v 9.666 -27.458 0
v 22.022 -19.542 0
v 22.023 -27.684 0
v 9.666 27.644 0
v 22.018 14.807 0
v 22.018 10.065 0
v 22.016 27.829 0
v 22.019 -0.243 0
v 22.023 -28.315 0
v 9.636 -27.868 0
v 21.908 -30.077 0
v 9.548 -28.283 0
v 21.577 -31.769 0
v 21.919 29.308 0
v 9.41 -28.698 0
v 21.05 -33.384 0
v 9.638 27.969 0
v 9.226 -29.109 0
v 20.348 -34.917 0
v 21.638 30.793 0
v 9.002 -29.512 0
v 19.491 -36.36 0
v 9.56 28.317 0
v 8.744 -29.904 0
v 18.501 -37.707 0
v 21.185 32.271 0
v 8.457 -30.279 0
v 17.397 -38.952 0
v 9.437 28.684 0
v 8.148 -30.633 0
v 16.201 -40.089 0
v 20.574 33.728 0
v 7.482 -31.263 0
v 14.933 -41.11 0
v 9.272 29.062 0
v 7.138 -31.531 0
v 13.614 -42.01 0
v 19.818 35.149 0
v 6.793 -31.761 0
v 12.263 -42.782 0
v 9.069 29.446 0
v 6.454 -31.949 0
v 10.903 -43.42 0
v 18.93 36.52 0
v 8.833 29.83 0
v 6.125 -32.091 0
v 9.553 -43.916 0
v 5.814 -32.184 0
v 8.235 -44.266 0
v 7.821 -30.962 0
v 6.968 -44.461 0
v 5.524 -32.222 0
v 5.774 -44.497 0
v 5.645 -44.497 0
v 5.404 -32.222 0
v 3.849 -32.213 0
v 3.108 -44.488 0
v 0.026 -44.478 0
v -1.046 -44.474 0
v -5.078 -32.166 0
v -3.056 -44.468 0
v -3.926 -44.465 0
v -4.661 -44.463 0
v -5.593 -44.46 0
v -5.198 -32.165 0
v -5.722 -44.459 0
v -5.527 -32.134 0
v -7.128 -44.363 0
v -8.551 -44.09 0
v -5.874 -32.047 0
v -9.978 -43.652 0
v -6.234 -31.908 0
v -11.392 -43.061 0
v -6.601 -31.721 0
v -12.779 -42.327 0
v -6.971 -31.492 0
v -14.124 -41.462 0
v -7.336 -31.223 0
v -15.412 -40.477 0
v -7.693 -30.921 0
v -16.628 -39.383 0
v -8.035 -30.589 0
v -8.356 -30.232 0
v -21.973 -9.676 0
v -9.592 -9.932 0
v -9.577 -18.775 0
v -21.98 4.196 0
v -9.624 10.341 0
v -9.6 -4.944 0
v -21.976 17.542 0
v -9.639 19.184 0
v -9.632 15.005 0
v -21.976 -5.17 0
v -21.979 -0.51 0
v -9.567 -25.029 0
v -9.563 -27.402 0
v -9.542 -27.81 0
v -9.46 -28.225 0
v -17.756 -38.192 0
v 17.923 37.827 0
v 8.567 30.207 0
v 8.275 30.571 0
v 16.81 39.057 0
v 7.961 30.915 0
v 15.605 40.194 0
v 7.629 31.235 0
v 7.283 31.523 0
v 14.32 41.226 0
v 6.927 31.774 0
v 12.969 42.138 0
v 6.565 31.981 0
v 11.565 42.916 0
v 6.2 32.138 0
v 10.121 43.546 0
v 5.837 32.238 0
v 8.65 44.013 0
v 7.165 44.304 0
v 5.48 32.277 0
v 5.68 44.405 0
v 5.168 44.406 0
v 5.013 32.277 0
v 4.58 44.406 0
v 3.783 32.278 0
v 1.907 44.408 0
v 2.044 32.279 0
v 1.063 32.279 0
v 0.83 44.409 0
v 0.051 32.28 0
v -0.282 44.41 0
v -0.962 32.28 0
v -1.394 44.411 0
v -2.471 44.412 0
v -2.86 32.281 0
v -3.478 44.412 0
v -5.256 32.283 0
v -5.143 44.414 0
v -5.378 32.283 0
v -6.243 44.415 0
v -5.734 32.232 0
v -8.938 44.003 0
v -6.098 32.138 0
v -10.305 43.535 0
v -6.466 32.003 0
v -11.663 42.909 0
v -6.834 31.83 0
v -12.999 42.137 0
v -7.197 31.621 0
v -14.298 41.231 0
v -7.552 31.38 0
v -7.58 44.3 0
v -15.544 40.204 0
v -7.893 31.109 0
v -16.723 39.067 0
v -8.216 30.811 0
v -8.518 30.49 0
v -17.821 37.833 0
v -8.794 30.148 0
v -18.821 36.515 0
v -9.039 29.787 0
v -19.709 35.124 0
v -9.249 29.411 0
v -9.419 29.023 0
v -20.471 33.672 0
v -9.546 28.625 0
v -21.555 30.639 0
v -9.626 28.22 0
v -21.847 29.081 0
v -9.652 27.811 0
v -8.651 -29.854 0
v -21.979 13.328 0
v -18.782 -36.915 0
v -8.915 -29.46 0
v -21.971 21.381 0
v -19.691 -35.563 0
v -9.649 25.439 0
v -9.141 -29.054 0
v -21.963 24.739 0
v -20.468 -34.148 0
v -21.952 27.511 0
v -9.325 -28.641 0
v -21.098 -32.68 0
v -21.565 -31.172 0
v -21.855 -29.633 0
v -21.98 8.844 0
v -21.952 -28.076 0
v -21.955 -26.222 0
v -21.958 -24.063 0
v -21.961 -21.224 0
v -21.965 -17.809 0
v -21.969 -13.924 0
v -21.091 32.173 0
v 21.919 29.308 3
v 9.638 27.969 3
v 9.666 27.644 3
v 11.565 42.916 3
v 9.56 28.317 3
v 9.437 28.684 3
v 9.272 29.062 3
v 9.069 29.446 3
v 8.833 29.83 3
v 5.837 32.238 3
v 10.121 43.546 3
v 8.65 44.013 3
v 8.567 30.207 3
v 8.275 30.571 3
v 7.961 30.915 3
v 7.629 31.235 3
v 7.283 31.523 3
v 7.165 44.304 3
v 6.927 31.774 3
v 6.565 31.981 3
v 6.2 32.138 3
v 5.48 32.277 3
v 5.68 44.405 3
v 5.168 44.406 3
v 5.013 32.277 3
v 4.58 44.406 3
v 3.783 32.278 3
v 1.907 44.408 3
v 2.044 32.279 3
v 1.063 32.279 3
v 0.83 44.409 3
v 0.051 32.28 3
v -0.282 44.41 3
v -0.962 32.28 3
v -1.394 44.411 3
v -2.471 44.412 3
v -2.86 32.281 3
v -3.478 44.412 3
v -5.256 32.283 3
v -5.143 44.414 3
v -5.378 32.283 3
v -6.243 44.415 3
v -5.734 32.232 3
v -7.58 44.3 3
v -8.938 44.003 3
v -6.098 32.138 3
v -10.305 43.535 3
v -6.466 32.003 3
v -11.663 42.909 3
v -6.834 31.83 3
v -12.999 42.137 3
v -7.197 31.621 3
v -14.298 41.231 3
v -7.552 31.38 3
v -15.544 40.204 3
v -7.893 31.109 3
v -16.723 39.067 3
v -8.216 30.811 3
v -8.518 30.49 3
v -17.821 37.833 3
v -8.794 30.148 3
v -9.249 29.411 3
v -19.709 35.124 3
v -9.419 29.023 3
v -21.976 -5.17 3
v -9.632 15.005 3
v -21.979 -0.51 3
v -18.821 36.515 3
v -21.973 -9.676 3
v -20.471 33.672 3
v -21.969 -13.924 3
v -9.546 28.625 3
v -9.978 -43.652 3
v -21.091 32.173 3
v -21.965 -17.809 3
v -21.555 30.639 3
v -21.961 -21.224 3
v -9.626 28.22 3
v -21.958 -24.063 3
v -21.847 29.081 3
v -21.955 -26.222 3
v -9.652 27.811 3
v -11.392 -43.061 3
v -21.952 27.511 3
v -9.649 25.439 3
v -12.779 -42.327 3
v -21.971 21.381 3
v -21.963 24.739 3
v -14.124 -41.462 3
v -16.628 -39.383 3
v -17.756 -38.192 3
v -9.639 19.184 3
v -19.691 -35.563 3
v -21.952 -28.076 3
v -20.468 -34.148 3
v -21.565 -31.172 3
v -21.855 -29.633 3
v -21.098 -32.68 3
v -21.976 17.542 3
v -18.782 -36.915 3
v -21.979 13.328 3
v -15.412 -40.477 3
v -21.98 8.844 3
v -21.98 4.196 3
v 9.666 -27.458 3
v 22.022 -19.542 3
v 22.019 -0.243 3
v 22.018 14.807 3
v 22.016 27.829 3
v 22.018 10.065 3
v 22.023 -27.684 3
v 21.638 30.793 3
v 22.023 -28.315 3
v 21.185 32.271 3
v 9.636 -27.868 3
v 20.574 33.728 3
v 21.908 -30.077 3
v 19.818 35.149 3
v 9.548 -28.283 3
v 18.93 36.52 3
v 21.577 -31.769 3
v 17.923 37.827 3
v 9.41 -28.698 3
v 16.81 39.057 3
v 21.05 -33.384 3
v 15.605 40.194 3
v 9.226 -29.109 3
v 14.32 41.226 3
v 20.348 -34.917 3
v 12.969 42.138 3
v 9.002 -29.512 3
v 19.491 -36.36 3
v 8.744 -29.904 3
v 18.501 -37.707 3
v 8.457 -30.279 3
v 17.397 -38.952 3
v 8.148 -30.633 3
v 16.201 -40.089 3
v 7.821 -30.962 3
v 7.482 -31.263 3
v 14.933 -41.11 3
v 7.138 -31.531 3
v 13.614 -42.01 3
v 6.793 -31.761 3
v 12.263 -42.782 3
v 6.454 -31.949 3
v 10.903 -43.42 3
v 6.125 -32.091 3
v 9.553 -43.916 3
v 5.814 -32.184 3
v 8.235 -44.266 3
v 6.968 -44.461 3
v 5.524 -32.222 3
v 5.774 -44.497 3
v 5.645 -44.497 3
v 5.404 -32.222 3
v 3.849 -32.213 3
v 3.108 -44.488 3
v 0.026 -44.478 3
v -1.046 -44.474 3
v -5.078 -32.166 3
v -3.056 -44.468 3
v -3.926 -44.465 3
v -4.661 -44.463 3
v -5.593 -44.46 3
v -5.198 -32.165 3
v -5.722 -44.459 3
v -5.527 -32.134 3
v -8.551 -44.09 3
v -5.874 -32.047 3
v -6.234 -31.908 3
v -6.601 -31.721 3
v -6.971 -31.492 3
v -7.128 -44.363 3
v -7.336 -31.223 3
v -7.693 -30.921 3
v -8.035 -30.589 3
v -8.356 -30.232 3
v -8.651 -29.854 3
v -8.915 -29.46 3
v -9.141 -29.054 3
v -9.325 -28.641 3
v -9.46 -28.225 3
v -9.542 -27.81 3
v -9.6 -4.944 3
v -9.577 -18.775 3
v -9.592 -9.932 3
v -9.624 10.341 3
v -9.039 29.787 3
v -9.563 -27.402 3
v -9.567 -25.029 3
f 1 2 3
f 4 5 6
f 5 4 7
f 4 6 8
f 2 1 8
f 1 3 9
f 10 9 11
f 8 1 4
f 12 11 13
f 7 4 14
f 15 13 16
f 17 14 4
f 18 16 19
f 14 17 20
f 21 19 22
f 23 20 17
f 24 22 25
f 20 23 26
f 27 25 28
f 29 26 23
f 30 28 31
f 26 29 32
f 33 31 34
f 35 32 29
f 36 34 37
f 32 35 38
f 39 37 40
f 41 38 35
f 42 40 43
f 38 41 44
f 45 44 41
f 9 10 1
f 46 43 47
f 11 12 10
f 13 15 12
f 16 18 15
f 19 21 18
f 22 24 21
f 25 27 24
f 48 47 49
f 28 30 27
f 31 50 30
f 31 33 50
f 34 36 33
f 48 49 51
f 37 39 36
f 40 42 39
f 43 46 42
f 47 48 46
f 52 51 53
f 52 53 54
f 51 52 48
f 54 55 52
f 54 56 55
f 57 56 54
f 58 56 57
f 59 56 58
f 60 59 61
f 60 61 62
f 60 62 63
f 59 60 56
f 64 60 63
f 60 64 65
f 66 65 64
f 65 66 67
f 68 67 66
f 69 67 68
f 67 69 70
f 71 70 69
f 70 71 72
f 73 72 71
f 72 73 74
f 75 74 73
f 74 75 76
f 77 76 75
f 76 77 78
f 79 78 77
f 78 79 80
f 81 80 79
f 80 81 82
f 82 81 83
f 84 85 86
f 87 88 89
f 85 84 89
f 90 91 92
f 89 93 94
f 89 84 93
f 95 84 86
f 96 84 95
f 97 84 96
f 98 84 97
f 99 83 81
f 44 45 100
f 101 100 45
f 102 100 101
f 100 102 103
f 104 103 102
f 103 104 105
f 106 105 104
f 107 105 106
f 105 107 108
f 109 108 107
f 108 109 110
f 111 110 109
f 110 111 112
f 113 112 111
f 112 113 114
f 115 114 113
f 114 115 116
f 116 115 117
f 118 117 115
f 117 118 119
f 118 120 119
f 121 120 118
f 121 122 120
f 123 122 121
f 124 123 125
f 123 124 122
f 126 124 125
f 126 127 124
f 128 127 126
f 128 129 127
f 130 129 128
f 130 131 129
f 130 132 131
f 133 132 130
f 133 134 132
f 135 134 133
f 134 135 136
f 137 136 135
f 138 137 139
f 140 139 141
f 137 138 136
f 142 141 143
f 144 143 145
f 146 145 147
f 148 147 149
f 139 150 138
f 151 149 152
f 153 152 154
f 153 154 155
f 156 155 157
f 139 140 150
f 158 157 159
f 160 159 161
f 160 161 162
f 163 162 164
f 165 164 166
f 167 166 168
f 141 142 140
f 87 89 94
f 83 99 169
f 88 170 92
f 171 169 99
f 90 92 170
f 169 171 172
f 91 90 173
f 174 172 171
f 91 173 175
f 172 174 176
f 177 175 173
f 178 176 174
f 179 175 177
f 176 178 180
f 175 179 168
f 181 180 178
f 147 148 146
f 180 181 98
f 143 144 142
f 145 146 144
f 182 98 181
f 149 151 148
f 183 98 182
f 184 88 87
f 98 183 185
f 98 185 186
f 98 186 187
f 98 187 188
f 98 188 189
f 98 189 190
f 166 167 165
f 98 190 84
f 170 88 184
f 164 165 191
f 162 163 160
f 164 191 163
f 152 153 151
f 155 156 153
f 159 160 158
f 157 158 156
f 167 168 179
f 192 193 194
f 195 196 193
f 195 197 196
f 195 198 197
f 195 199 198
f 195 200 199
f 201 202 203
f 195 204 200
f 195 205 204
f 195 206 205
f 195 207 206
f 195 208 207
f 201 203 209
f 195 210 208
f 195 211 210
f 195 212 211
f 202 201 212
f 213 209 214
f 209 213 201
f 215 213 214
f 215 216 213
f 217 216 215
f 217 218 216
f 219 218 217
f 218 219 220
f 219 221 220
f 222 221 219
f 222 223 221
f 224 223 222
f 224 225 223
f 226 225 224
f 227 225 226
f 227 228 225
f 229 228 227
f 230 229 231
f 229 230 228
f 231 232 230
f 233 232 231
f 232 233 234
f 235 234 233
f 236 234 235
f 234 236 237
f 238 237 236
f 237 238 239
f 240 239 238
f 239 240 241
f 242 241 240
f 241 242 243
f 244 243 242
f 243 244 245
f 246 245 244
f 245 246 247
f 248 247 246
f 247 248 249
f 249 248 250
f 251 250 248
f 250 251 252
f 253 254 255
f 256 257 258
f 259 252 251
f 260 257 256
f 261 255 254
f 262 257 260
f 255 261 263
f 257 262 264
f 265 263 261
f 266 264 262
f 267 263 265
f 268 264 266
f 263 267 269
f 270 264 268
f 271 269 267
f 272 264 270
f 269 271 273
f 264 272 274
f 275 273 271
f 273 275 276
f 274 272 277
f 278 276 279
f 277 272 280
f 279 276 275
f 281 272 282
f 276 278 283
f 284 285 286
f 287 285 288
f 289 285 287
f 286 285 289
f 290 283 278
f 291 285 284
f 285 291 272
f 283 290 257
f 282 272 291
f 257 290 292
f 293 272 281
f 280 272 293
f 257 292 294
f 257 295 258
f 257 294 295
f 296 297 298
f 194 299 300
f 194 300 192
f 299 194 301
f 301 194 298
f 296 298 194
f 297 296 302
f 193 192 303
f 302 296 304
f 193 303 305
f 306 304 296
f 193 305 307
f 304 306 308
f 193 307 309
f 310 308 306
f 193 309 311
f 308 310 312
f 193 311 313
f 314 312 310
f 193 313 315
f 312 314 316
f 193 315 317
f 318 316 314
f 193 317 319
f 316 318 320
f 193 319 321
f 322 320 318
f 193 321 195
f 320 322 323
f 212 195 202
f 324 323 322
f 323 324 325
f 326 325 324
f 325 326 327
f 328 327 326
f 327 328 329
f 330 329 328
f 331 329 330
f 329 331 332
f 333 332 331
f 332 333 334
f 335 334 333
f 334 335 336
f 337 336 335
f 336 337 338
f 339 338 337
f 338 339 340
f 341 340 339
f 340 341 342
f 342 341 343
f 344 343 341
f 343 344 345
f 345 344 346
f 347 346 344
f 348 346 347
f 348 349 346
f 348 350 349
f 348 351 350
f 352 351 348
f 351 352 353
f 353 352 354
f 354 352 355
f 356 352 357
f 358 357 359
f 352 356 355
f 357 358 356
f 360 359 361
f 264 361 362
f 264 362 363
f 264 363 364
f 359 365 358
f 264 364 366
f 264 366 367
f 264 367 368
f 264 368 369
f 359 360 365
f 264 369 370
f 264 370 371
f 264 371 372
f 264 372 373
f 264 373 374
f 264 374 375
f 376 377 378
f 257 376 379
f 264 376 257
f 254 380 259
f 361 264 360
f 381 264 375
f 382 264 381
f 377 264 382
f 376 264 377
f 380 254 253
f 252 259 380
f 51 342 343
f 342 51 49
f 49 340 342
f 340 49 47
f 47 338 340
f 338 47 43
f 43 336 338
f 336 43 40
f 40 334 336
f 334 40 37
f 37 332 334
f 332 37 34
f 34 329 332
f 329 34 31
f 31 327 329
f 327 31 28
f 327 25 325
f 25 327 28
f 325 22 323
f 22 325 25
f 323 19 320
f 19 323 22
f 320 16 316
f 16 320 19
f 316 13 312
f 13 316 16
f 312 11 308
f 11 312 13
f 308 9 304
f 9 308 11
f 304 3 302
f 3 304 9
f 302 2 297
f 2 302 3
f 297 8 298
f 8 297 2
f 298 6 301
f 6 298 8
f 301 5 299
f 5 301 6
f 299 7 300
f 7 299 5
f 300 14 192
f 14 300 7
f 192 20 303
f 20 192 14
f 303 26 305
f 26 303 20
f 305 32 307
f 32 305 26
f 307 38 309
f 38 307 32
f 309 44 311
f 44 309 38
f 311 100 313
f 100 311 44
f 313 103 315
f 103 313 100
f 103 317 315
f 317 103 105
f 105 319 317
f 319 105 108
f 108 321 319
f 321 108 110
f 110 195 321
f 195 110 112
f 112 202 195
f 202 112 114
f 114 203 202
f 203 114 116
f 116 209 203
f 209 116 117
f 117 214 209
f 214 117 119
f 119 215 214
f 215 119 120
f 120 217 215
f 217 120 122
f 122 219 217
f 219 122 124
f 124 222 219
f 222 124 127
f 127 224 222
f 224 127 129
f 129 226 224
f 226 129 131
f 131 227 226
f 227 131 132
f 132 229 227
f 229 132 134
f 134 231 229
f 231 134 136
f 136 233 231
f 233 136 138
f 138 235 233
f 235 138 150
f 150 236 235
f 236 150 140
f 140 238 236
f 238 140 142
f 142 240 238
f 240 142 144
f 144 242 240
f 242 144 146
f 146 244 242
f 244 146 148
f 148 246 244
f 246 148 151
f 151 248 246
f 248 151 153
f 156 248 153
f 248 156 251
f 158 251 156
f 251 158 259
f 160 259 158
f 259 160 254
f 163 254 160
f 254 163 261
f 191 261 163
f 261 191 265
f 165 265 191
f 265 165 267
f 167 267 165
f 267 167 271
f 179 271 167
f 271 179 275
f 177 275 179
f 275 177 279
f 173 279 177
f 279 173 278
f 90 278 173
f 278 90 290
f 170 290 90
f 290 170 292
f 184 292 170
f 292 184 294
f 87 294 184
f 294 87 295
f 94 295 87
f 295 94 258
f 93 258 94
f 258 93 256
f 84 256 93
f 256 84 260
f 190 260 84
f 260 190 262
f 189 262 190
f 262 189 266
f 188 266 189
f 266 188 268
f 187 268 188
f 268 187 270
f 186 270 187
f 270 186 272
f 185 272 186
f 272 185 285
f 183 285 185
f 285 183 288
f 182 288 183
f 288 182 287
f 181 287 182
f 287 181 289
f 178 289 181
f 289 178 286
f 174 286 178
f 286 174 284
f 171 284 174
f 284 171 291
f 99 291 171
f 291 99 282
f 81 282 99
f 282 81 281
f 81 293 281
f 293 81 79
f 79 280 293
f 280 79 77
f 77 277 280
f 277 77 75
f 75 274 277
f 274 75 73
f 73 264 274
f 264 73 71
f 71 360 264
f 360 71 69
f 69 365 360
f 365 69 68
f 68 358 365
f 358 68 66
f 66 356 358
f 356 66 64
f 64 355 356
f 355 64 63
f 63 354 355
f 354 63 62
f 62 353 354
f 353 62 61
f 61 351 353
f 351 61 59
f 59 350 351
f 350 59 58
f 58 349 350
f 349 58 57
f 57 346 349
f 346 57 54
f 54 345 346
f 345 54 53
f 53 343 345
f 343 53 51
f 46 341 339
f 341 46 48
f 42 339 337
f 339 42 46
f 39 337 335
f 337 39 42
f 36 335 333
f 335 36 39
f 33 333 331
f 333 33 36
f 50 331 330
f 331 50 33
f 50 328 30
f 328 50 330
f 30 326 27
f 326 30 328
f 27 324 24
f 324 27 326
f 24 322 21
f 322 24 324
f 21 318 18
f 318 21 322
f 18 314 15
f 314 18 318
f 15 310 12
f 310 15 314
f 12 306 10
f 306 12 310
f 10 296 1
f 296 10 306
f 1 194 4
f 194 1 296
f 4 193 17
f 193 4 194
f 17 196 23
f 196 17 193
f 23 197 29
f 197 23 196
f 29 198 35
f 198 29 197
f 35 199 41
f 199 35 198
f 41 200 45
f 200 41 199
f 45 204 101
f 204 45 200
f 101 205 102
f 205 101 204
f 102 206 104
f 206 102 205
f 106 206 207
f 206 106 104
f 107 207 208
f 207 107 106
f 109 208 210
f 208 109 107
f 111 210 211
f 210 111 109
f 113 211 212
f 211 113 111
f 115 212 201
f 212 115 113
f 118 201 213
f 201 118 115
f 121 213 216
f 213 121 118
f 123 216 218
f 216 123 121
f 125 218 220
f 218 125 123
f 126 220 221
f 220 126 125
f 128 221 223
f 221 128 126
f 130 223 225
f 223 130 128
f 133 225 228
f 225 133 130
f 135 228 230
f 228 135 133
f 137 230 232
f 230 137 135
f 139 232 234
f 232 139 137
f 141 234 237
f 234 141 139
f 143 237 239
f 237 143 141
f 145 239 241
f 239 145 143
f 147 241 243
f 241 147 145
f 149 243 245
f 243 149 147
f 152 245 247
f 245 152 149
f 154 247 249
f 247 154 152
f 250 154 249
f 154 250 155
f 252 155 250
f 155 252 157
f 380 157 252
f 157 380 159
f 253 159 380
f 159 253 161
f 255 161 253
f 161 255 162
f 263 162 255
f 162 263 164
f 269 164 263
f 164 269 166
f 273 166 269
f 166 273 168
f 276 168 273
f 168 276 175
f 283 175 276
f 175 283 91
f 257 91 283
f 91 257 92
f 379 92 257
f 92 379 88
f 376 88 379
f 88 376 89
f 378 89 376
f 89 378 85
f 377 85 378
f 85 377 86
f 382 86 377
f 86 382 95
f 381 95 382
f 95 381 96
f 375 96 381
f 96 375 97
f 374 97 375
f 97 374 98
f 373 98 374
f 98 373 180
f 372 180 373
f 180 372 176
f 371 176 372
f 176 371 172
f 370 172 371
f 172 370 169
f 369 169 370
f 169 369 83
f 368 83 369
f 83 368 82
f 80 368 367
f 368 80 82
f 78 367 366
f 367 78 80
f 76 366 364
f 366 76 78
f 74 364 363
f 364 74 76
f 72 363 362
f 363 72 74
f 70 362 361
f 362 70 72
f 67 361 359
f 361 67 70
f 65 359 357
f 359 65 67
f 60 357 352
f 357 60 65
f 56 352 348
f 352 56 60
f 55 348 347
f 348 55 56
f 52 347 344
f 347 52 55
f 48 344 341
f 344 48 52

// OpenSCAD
// Generated from 交通部公路局（原交通部公路總局）「新式號牌使用之英文字、數字字體」author trace
fudge = 0.1;

module glyph_2012_O(h = 3) {
  difference() {
    linear_extrude(height = h)
      polygon(points = [[-6.2432, 44.4146], [-7.5797, 44.3003], [-8.9385, 44.0032], [-10.3046, 43.5355], [-11.6631, 42.9094], [-12.9991, 42.1373], [-14.2978, 41.2313], [-15.5442, 40.2038], [-16.7235, 39.067], [-17.8207, 37.8332], [-18.821, 36.5147], [-19.7094, 35.1237], [-20.4711, 33.6725], [-21.0912, 32.1735], [-21.5547, 30.6388], [-21.8468, 29.0807], [-21.9525, 27.5115], [-21.9629, 24.7395], [-21.9707, 21.3811], [-21.976, 17.542], [-21.9792, 13.3277], [-21.9805, 8.8438], [-21.9803, 4.1958], [-21.9788, -0.5105], [-21.9762, -5.1698], [-21.9729, -9.6763], [-21.9692, -13.9245], [-21.9652, -17.8088], [-21.9614, -21.2236], [-21.9579, -24.0634], [-21.9551, -26.2225], [-21.9532, -27.5954], [-21.9525, -28.0765], [-21.8549, -29.6333], [-21.565, -31.1717], [-21.0978, -32.6803], [-20.4683, -34.148], [-19.6915, -35.5633], [-18.7825, -36.9152], [-17.7562, -38.1922], [-16.6277, -39.3832], [-15.412, -40.4768], [-14.1242, -41.4617], [-12.7791, -42.3268], [-11.392, -43.0607], [-9.9777, -43.6521], [-8.5513, -44.0899], [-7.1278, -44.3626], [-5.7223, -44.4591], [-5.5932, -44.4596], [-5.2283, -44.4608], [-4.6614, -44.4626], [-3.926, -44.4651], [-3.0559, -44.4679], [-2.0848, -44.4711], [-1.0463, -44.4745], [0.0259, -44.4781], [1.098, -44.4816], [2.1365, -44.485], [3.1077, -44.4882], [3.9777, -44.4911], [4.7131, -44.4935], [5.2801, -44.4954], [5.6449, -44.4966], [5.774, -44.497], [6.9683, -44.4615], [8.235, -44.2658], [9.5535, -43.9164], [10.9032, -43.4197], [12.2635, -42.7822], [13.6136, -42.0103], [14.9331, -41.1104], [16.2012, -40.089], [17.3974, -38.9525], [18.5009, -37.7074], [19.4913, -36.36], [20.3478, -34.9168], [21.0498, -33.3842], [21.5767, -31.7687], [21.9079, -30.0767], [22.0228, -28.3147], [22.0227, -27.6842], [22.0225, -25.9023], [22.0222, -23.1335], [22.0218, -19.5423], [22.0213, -15.2931], [22.0207, -10.5506], [22.0201, -5.479], [22.0195, -0.243], [22.0189, 4.9931], [22.0183, 10.0646], [22.0178, 14.8072], [22.0173, 19.0563], [22.0169, 22.6476], [22.0166, 25.4163], [22.0164, 27.1982], [22.0163, 27.8288], [21.9195, 29.3077], [21.6381, 30.7932], [21.1853, 32.2713], [20.5743, 33.7277], [19.8181, 35.1486], [18.93, 36.5197], [17.923, 37.8271], [16.8103, 39.0568], [15.605, 40.1945], [14.3203, 41.2263], [12.9693, 42.1382], [11.5652, 42.9159], [10.1211, 43.5456], [8.65, 44.0131], [7.1653, 44.3044], [5.6799, 44.4054], [5.546, 44.4055], [5.1676, 44.4058], [4.5796, 44.4062], [3.8169, 44.4068], [2.9145, 44.4075], [1.9074, 44.4083], [0.8303, 44.4091], [-0.2816, 44.41], [-1.3936, 44.4108], [-2.4706, 44.4117], [-3.4778, 44.4124], [-4.3802, 44.4131], [-5.1429, 44.4137], [-5.7309, 44.4142], [-6.1093, 44.4145]]);
    translate([0, 0, -fudge])
      linear_extrude(height = h + 2 * fudge)
        polygon(points = [[-5.3779, 32.2828], [-5.256, 32.2828], [-4.9114, 32.2826], [-4.376, 32.2823], [-3.6814, 32.2819], [-2.8597, 32.2814], [-1.9425, 32.2809], [-0.9617, 32.2804], [0.0509, 32.2798], [1.0635, 32.2793], [2.0442, 32.2787], [2.9614, 32.2782], [3.7832, 32.2778], [4.4777, 32.2774], [5.0131, 32.2771], [5.3577, 32.2769], [5.4797, 32.2768], [5.8371, 32.2384], [6.2001, 32.1377], [6.5648, 31.9808], [6.9271, 31.774], [7.2833, 31.5234], [7.6292, 31.2351], [7.9611, 30.9155], [8.275, 30.5706], [8.5669, 30.2067], [8.833, 29.8299], [9.0692, 29.4464], [9.2718, 29.0623], [9.4366, 28.6839], [9.5599, 28.3174], [9.6377, 27.9689], [9.666, 27.6445], [9.666, 27.0257], [9.666, 25.2768], [9.666, 22.5594], [9.666, 19.0347], [9.666, 14.8643], [9.666, 10.2096], [9.666, 5.2321], [9.666, 0.0931], [9.666, -5.0459], [9.666, -10.0235], [9.666, -14.6782], [9.666, -18.8485], [9.666, -22.3732], [9.666, -25.0907], [9.666, -26.8395], [9.666, -27.4584], [9.6357, -27.8681], [9.5485, -28.2826], [9.41, -28.6976], [9.226, -29.1089], [9.0022, -29.5123], [8.744, -29.9036], [8.4573, -30.2786], [8.1477, -30.6329], [7.8207, -30.9625], [7.4822, -31.2632], [7.1378, -31.5306], [6.793, -31.7606], [6.4536, -31.949], [6.1252, -32.0915], [5.8136, -32.184], [5.5242, -32.2222], [5.4038, -32.2216], [5.0635, -32.2198], [4.5347, -32.217], [3.8488, -32.2134], [3.0373, -32.2091], [2.1315, -32.2043], [1.1629, -32.1992], [0.1629, -32.1939], [-0.8372, -32.1886], [-1.8058, -32.1835], [-2.7115, -32.1787], [-3.5231, -32.1744], [-4.2089, -32.1708], [-4.7377, -32.168], [-5.0781, -32.1662], [-5.1985, -32.1655], [-5.5267, -32.1345], [-5.8737, -32.0472], [-6.2337, -31.908], [-6.6012, -31.7213], [-6.9707, -31.4917], [-7.3364, -31.2235], [-7.6929, -30.9212], [-8.0346, -30.5893], [-8.3559, -30.2322], [-8.6511, -29.8544], [-8.9147, -29.4603], [-9.1412, -29.0544], [-9.3249, -28.6412], [-9.4602, -28.225], [-9.5416, -27.8103], [-9.5634, -27.4017], [-9.5644, -26.7816], [-9.5673, -25.0293], [-9.5717, -22.3064], [-9.5774, -18.7747], [-9.5841, -14.596], [-9.5916, -9.932], [-9.5997, -4.9445], [-9.608, 0.2047], [-9.6163, 5.354], [-9.6243, 10.3415], [-9.6319, 15.0055], [-9.6386, 19.1842], [-9.6443, 22.7158], [-9.6487, 25.4387], [-9.6515, 27.1911], [-9.6525, 27.8112], [-9.6256, 28.2198], [-9.5464, 28.6246], [-9.4193, 29.0226], [-9.2486, 29.411], [-9.0386, 29.7869], [-8.7937, 30.1476], [-8.5182, 30.49], [-8.2165, 30.8114], [-7.8928, 31.109], [-7.5516, 31.3798], [-7.1971, 31.6209], [-6.8337, 31.8297], [-6.4658, 32.003], [-6.0976, 32.1383], [-5.7336, 32.2324], [-5.3779, 32.2827], [-5.3779, 32.2827], [-5.3779, 32.2827], [-5.3779, 32.2827], [-5.3779, 32.2827], [-5.3779, 32.2827], [-5.3779, 32.2828], [-5.3779, 32.2828], [-5.3779, 32.2828], [-5.3779, 32.2828], [-5.3779, 32.2828], [-5.3779, 32.2828], [-5.3779, 32.2828], [-5.3779, 32.2828], [-5.3779, 32.2828], [-5.3779, 32.2828]]);
  }
}

glyph_2012_O();
